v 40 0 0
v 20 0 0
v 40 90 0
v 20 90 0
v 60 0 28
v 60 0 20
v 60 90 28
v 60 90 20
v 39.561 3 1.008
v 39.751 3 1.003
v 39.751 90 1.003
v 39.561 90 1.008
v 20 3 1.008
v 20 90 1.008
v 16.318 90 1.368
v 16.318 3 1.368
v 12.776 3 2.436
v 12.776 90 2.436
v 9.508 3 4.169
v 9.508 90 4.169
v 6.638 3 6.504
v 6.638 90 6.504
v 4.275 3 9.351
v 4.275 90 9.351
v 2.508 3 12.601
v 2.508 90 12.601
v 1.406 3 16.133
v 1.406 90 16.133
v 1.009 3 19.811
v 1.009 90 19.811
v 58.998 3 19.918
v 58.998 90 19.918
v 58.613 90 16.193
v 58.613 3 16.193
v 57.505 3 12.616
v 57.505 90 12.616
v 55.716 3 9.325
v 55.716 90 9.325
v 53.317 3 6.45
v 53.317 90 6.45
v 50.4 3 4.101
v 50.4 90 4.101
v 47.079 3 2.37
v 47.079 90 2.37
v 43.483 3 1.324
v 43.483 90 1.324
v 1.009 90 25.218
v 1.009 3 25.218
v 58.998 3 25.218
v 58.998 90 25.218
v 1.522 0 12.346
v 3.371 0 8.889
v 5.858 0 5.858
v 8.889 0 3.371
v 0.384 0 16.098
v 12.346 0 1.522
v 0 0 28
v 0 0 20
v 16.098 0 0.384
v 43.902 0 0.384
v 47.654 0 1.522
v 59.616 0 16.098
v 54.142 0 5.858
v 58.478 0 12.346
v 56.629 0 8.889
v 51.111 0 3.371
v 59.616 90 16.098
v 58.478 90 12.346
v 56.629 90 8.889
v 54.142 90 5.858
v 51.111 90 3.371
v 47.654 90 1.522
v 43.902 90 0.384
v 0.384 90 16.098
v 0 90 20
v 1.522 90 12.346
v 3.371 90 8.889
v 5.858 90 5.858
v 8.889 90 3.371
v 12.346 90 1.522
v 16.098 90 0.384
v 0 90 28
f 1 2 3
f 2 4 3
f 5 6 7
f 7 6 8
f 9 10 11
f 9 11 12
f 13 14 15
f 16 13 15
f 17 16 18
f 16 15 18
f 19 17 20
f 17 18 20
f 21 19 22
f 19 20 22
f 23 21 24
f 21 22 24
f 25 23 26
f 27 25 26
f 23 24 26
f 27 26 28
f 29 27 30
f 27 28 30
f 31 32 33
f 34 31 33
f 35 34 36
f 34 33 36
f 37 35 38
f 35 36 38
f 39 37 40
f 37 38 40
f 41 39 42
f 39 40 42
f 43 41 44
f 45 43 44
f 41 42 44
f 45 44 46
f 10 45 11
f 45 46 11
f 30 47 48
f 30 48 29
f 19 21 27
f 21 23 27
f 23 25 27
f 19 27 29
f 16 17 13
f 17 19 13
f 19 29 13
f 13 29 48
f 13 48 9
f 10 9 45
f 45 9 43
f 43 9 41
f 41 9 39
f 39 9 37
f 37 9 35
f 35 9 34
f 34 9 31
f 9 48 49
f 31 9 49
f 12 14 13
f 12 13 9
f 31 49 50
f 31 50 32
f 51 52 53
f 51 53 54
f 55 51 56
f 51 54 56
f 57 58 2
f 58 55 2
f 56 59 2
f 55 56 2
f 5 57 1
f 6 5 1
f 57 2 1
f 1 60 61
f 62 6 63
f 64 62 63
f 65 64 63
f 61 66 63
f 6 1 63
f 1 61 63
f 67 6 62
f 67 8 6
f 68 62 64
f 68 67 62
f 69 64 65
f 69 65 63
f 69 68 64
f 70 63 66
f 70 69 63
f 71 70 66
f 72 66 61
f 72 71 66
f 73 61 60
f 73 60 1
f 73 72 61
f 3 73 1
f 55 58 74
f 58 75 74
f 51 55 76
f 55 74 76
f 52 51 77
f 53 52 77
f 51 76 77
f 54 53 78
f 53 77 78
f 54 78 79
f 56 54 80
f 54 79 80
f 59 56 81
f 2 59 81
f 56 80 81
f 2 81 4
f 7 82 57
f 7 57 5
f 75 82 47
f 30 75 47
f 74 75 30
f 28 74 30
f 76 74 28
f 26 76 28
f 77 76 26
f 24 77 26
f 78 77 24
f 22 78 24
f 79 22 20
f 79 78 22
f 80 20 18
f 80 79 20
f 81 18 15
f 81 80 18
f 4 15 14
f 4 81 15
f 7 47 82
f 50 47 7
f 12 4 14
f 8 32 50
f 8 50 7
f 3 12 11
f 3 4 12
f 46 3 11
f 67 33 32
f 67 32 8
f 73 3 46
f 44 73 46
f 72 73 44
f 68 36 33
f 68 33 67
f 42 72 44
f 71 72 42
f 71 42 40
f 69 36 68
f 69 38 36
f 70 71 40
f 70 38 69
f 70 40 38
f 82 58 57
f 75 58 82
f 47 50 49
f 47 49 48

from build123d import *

# Parameters (mm, degrees)
SKETCH015_W     = 60
SKETCH015_H     = 90
PAD007_DEPTH    = 28
FILLET_R        = 20
POCKET008_DEPTH = 87


with BuildPart() as part:
    # Sketch015 (on XY_Plane007 of Origin014) → Pad007 (new body)
    with BuildSketch(Plane.XY):
        with Locations((30, 45)):
            Rectangle(SKETCH015_W, SKETCH015_H)
    extrude(amount=PAD007_DEPTH)

    # Fillet
    fillet_edges = [part.edges().sort_by_distance(p)[0] for p in [
        (0, 45, 0),
        (60, 45, 0),
    ]]
    fillet(fillet_edges, radius=FILLET_R)

    # Sketch017 (on Face8 of Fillet) → Pocket008 (cut)
    with BuildSketch(Plane(origin=(0, 90, 0), x_dir=(-1, 0, 0), z_dir=(0, 1, 0))):
        with BuildLine():
            Line((-58.998235, 25.217793), (-1.00896, 25.217793))
            Line((-1.00896, 25.217793), (-1.00896, 19.810799))
            ThreePointArc((-20, 1.008018), (-6.637701, 6.503914), (-1.00896, 19.810799))
            Line((-20, 1.008018), (-39.561207, 1.008018))
            Line((-39.7511, 1.00322), (-39.561207, 1.008018))
            ThreePointArc((-58.998235, 19.918358), (-53.316531, 6.449738), (-39.7511, 1.00322))
            Line((-58.998235, 25.217793), (-58.998235, 19.918358))
        make_face()
    extrude(amount=-POCKET008_DEPTH, mode=Mode.SUBTRACT)


solid = part.part
